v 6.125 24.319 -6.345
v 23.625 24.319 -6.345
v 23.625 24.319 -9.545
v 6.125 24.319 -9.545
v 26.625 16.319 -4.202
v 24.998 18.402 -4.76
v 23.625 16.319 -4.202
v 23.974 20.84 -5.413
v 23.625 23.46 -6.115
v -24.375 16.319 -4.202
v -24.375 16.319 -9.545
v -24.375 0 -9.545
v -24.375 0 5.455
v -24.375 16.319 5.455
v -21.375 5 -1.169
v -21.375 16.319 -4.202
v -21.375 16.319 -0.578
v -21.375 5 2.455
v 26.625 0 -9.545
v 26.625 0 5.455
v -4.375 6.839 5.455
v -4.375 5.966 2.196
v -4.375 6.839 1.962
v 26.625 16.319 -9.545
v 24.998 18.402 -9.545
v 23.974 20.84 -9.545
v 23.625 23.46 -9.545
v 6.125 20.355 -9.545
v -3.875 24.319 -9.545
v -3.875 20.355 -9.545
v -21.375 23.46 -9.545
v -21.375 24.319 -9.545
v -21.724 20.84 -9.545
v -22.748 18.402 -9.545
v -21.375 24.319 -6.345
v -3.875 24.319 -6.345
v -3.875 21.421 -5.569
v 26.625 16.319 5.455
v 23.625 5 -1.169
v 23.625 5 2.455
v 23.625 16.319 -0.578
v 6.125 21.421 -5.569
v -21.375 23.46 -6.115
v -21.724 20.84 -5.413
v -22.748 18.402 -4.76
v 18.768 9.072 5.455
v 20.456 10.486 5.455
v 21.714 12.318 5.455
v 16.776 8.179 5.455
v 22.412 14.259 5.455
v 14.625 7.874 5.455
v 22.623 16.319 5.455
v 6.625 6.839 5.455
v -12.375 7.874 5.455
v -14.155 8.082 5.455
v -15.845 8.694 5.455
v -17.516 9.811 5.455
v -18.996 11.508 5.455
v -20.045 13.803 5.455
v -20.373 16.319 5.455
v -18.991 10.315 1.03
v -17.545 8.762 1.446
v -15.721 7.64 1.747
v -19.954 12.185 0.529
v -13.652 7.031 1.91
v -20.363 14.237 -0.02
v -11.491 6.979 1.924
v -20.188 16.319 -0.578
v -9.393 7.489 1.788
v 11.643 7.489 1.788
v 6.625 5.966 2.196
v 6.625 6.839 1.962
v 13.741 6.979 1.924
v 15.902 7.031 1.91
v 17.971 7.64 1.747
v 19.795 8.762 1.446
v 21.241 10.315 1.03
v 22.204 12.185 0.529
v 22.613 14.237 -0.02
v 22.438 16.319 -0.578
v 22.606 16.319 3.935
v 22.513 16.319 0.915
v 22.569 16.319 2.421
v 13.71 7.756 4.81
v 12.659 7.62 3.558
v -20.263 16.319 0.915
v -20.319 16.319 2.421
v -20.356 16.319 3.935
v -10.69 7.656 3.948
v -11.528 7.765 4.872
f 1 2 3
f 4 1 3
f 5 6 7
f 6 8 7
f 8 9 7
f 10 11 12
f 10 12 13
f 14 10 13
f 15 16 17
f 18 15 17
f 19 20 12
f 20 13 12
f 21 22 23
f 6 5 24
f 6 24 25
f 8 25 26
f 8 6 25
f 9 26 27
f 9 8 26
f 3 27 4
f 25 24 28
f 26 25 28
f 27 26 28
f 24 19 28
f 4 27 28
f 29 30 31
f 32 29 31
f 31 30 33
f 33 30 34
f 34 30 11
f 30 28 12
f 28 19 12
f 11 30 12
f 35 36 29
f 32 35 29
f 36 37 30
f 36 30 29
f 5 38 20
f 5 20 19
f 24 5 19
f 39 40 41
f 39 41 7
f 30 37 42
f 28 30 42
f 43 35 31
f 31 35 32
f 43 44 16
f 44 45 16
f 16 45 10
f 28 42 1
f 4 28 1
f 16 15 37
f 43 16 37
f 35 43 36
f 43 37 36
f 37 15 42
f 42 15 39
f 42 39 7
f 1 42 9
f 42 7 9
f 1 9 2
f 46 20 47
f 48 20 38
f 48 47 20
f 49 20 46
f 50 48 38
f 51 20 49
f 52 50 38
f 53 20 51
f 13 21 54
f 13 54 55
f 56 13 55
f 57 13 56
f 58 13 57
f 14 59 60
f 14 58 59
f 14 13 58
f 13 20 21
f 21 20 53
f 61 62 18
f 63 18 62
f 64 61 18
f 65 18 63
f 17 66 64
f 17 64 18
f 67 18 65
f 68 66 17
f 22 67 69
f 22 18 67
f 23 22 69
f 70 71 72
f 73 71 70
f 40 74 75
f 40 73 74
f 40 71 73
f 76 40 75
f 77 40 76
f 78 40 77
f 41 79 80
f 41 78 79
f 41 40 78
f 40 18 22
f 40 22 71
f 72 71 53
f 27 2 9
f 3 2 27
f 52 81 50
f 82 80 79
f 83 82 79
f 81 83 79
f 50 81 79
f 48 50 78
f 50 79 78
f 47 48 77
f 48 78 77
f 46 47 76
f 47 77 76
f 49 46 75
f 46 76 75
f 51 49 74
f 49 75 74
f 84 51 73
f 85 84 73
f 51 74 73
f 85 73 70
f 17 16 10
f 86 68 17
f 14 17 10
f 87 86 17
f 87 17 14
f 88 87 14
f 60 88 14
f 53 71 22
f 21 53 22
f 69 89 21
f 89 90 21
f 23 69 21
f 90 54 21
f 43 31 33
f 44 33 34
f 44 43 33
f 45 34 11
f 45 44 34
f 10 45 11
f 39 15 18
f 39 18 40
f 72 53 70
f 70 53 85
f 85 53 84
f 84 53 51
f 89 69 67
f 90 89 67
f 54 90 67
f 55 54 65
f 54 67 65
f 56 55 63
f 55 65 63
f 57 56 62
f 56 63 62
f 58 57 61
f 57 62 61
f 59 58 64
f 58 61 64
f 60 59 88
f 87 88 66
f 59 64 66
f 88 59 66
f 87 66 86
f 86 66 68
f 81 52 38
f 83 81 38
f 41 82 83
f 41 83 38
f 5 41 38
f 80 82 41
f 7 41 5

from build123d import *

# Parameters (mm, degrees)
SKETCH1_W           = 45
SKETCH1_H           = 15
BOSS_EXTRUDE1_DEPTH = 5
BOSS_EXTRUDE2_DEPTH = 45
SKETCH5_R           = 8
CUT_EXTRUDE1_DEPTH  = 10
CUT_EXTRUDE2_REACH  = 39.075
SKETCH6_W           = 45
SKETCH6_H           = 8
SKETCH7_W           = 11
SKETCH7_H           = 10.717790556
CUT_EXTRUDE4_DEPTH  = 6.5
CUT_EXTRUDE5_REACH  = 39.075
SKETCH10_W          = 15
SKETCH10_H          = 16.318516526
BOSS_EXTRUDE3_DEPTH = 3
SKETCH11_W          = 15
SKETCH11_H          = 16.318516526
BOSS_EXTRUDE4_DEPTH = 3
SKETCH12_W          = 10
SKETCH12_H          = 7.679226714
CUT_EXTRUDE6_DEPTH  = 6
FILLET1_R           = 10


with BuildPart() as part:
    # Sketch1 → Boss-Extrude1 (new body)
    with BuildSketch(Plane(origin=(0, 0, 0), x_dir=(1, 0, 0), z_dir=(0, 1, 0))):
        with Locations((1.125, 2.045454545)):
            Rectangle(SKETCH1_W, SKETCH1_H)
    extrude(amount=BOSS_EXTRUDE1_DEPTH)

    # Sketch2 → Boss-Extrude2 (add)
    with BuildSketch(Plane(origin=(23.625, 0, 0), x_dir=(0, 0, -1), z_dir=(1, 0, 0))):
        Polygon((-2.454545455, 5), (2.721835448, 24.318516526), (-5.454545455, 24.318516526), (-5.454545455, 5), align=None)
        Polygon((1.168921177, 5), (6.345302079, 24.318516526), (9.545454545, 24.318516526), (9.545454545, 5), align=None)
    extrude(amount=-BOSS_EXTRUDE2_DEPTH)

    # Sketch5 → Cut-Extrude1 (cut)
    with BuildSketch(Plane(origin=(0, 0.948572854, 3.540122086), x_dir=(-1, 0, 0), z_dir=(0, -0.2588190451025247, -0.9659258262890673))):
        with Locations(Location((12.375, 14.194346021, 0), (0, 0, 90))):
            Circle(SKETCH5_R)
        with Locations(Location((-14.625, 14.194346021, 0), (0, 0, 90))):
            Circle(SKETCH5_R)
    extrude(amount=-CUT_EXTRUDE1_DEPTH, mode=Mode.SUBTRACT)

    # Cut-Extrude2: up to this plane
    cut_extrude2_end = Plane(origin=(-21.375, 5, 2.454545455), z_dir=(0, -0.2588190451025246, -0.9659258262890673))
    # Sketch6 → Cut-Extrude2 (cut, up to the surface)
    with BuildSketch(Plane.XY.offset(5.454545455), mode=Mode.PRIVATE) as cut_extrude2_sk1:
        with Locations((1.125, 20.318516526)):
            Rectangle(SKETCH6_W, SKETCH6_H)
    cut_extrude2_tool1 = split(extrude(cut_extrude2_sk1.sketch, amount=-CUT_EXTRUDE2_REACH, mode=Mode.PRIVATE), bisect_by=cut_extrude2_end, keep=Keep.BOTH, mode=Mode.PRIVATE)
    add(cut_extrude2_tool1.solids().sort_by_distance((1.125, 20.318517, 5.454545))[0], mode=Mode.SUBTRACT)

    # Sketch7 → Cut-Extrude4 (cut)
    with BuildSketch(Plane(origin=(0, 0.948572854, 3.540122086), x_dir=(-1, 0, 0), z_dir=(0, -0.2588190451025247, -0.9659258262890673))):
        with Locations((-1.125, 10.553241299)):
            Rectangle(SKETCH7_W, SKETCH7_H)
    extrude(amount=-CUT_EXTRUDE4_DEPTH, mode=Mode.SUBTRACT)


with BuildPart() as cut_extrude4_piece_1:
    # of the separate pieces the step leaves, piece 1, a body of its own (cut_extrude4_pieces)
    add(part.part.solids().sort_by_distance((-21.375, 0, -9.545454545))[0])


with BuildPart() as cut_extrude4_piece_2:
    # of the separate pieces the step leaves, piece 2, a body of its own (cut_extrude4_pieces)
    add(part.part.solids().sort_by_distance((-4.375, 16.318516526, -0.578241908))[0])


with BuildPart() as cut_extrude4_piece_3:
    # of the separate pieces the step leaves, piece 3, a body of its own (cut_extrude4_pieces)
    add(part.part.solids().sort_by_distance((6.811601533, 16.318516526, -0.578241908))[0])


with BuildPart() as cut_extrude5_tool:
    # Cut-Extrude5: up to this plane
    cut_extrude5_end = Plane(origin=(-21.375, 5, 2.454545455), z_dir=(0, -0.2588190451025246, -0.9659258262890673))
    # Sketch9 → Cut-Extrude5 (new, up to the surface)
    with BuildSketch(Plane.XY.offset(5.454545455), mode=Mode.PRIVATE) as cut_extrude5_sk1:
        Polygon((-12.375, 7.874399938), (-4.375, 6.839123758), (6.625, 6.839123758), (14.625, 7.874399938), (14.625, 17.142741254), (-12.375, 17.142741254), align=None)
    cut_extrude5_tool1 = split(extrude(cut_extrude5_sk1.sketch, amount=-CUT_EXTRUDE5_REACH, mode=Mode.PRIVATE), bisect_by=cut_extrude5_end, keep=Keep.BOTH, mode=Mode.PRIVATE)
    add(cut_extrude5_tool1.solids().sort_by_distance((1.125, 12.138424, 5.454545))[0])


with BuildPart() as cut_extrude4_piece_1_1:
    add(cut_extrude4_piece_1.part)

    # Cut-Extrude5: cut by cut_extrude5_tool
    add(cut_extrude5_tool.part, mode=Mode.SUBTRACT)

    # Sketch10 → Boss-Extrude3 (add)
    with BuildSketch(Plane.ZY.offset(21.375)):
        with Locations((-2.045454545, 8.159258263)):
            Rectangle(SKETCH10_W, SKETCH10_H)
    extrude(amount=BOSS_EXTRUDE3_DEPTH)

    # Sketch11 → Boss-Extrude4 (add)
    with BuildSketch(Plane(origin=(23.625, 0, 0), x_dir=(0, 0, -1), z_dir=(1, 0, 0))):
        with Locations((2.045454545, 8.159258263)):
            Rectangle(SKETCH11_W, SKETCH11_H)
    extrude(amount=BOSS_EXTRUDE4_DEPTH)

    # Sketch12 → Cut-Extrude6 (cut)
    with BuildSketch(Plane(origin=(0, 0.042706196, 0.159381694), x_dir=(1, 0, 0), z_dir=(0, 0.2588190451025247, 0.9659258262890673))):
        with Locations((1.125, 25.971781551)):
            Rectangle(SKETCH12_W, SKETCH12_H)
    extrude(amount=-CUT_EXTRUDE6_DEPTH, mode=Mode.SUBTRACT)

    # Fillet1
    # the kernel refuses this fillet: 10 mm, written as the material it adds along each edge
    with BuildSketch(Plane(origin=(-21.375, 16.318516526, 13.651862532), x_dir=(-1, 0, 0), z_dir=(0, 0, -1))) as fillet1_piece_1_section:
        with BuildLine():
            CenterArc((10, 7.141428429), FILLET1_R, 180, 45.572995999)
            Line((0, 7.141428429), (0, 0))
            Line((0, 0), (3, 0))
        make_face()
    fillet1_piece_1 = extrude(amount=23.197317077, mode=Mode.PRIVATE)
    fillet1_piece_1 = split(fillet1_piece_1, bisect_by=Plane(origin=(-22.137016454, 20.028758468, -5.195864872), z_dir=(0, -0.2588190451025247, -0.9659258262890673)), keep=Keep.TOP, mode=Mode.PRIVATE)
    add(fillet1_piece_1)
    with BuildSketch(Plane(origin=(23.625, 16.318516526, 13.651862532), x_dir=(1, 0, 0), z_dir=(0, 0, -1))) as fillet1_piece_2_section:
        with BuildLine():
            CenterArc((10, -7.141428429), FILLET1_R, 134.427004001, 45.572995999)
            Line((0, -7.141428429), (0, 0))
            Line((0, 0), (3, 0))
        make_face()
    fillet1_piece_2 = extrude(amount=23.197317077, mode=Mode.PRIVATE)
    fillet1_piece_2 = split(fillet1_piece_2, bisect_by=Plane(origin=(24.387016454, 20.028758468, -5.195864872), z_dir=(0, -0.2588190451025247, -0.9659258262890673)), keep=Keep.TOP, mode=Mode.PRIVATE)
    add(fillet1_piece_2)


with BuildPart() as cut_extrude4_piece_2_1:
    add(cut_extrude4_piece_2.part)

    # Cut-Extrude5: cut by cut_extrude5_tool
    add(cut_extrude5_tool.part, mode=Mode.SUBTRACT)


with BuildPart() as cut_extrude4_piece_3_1:
    add(cut_extrude4_piece_3.part)

    # Cut-Extrude5: cut by cut_extrude5_tool
    add(cut_extrude5_tool.part, mode=Mode.SUBTRACT)


solid = cut_extrude4_piece_1_1.part
